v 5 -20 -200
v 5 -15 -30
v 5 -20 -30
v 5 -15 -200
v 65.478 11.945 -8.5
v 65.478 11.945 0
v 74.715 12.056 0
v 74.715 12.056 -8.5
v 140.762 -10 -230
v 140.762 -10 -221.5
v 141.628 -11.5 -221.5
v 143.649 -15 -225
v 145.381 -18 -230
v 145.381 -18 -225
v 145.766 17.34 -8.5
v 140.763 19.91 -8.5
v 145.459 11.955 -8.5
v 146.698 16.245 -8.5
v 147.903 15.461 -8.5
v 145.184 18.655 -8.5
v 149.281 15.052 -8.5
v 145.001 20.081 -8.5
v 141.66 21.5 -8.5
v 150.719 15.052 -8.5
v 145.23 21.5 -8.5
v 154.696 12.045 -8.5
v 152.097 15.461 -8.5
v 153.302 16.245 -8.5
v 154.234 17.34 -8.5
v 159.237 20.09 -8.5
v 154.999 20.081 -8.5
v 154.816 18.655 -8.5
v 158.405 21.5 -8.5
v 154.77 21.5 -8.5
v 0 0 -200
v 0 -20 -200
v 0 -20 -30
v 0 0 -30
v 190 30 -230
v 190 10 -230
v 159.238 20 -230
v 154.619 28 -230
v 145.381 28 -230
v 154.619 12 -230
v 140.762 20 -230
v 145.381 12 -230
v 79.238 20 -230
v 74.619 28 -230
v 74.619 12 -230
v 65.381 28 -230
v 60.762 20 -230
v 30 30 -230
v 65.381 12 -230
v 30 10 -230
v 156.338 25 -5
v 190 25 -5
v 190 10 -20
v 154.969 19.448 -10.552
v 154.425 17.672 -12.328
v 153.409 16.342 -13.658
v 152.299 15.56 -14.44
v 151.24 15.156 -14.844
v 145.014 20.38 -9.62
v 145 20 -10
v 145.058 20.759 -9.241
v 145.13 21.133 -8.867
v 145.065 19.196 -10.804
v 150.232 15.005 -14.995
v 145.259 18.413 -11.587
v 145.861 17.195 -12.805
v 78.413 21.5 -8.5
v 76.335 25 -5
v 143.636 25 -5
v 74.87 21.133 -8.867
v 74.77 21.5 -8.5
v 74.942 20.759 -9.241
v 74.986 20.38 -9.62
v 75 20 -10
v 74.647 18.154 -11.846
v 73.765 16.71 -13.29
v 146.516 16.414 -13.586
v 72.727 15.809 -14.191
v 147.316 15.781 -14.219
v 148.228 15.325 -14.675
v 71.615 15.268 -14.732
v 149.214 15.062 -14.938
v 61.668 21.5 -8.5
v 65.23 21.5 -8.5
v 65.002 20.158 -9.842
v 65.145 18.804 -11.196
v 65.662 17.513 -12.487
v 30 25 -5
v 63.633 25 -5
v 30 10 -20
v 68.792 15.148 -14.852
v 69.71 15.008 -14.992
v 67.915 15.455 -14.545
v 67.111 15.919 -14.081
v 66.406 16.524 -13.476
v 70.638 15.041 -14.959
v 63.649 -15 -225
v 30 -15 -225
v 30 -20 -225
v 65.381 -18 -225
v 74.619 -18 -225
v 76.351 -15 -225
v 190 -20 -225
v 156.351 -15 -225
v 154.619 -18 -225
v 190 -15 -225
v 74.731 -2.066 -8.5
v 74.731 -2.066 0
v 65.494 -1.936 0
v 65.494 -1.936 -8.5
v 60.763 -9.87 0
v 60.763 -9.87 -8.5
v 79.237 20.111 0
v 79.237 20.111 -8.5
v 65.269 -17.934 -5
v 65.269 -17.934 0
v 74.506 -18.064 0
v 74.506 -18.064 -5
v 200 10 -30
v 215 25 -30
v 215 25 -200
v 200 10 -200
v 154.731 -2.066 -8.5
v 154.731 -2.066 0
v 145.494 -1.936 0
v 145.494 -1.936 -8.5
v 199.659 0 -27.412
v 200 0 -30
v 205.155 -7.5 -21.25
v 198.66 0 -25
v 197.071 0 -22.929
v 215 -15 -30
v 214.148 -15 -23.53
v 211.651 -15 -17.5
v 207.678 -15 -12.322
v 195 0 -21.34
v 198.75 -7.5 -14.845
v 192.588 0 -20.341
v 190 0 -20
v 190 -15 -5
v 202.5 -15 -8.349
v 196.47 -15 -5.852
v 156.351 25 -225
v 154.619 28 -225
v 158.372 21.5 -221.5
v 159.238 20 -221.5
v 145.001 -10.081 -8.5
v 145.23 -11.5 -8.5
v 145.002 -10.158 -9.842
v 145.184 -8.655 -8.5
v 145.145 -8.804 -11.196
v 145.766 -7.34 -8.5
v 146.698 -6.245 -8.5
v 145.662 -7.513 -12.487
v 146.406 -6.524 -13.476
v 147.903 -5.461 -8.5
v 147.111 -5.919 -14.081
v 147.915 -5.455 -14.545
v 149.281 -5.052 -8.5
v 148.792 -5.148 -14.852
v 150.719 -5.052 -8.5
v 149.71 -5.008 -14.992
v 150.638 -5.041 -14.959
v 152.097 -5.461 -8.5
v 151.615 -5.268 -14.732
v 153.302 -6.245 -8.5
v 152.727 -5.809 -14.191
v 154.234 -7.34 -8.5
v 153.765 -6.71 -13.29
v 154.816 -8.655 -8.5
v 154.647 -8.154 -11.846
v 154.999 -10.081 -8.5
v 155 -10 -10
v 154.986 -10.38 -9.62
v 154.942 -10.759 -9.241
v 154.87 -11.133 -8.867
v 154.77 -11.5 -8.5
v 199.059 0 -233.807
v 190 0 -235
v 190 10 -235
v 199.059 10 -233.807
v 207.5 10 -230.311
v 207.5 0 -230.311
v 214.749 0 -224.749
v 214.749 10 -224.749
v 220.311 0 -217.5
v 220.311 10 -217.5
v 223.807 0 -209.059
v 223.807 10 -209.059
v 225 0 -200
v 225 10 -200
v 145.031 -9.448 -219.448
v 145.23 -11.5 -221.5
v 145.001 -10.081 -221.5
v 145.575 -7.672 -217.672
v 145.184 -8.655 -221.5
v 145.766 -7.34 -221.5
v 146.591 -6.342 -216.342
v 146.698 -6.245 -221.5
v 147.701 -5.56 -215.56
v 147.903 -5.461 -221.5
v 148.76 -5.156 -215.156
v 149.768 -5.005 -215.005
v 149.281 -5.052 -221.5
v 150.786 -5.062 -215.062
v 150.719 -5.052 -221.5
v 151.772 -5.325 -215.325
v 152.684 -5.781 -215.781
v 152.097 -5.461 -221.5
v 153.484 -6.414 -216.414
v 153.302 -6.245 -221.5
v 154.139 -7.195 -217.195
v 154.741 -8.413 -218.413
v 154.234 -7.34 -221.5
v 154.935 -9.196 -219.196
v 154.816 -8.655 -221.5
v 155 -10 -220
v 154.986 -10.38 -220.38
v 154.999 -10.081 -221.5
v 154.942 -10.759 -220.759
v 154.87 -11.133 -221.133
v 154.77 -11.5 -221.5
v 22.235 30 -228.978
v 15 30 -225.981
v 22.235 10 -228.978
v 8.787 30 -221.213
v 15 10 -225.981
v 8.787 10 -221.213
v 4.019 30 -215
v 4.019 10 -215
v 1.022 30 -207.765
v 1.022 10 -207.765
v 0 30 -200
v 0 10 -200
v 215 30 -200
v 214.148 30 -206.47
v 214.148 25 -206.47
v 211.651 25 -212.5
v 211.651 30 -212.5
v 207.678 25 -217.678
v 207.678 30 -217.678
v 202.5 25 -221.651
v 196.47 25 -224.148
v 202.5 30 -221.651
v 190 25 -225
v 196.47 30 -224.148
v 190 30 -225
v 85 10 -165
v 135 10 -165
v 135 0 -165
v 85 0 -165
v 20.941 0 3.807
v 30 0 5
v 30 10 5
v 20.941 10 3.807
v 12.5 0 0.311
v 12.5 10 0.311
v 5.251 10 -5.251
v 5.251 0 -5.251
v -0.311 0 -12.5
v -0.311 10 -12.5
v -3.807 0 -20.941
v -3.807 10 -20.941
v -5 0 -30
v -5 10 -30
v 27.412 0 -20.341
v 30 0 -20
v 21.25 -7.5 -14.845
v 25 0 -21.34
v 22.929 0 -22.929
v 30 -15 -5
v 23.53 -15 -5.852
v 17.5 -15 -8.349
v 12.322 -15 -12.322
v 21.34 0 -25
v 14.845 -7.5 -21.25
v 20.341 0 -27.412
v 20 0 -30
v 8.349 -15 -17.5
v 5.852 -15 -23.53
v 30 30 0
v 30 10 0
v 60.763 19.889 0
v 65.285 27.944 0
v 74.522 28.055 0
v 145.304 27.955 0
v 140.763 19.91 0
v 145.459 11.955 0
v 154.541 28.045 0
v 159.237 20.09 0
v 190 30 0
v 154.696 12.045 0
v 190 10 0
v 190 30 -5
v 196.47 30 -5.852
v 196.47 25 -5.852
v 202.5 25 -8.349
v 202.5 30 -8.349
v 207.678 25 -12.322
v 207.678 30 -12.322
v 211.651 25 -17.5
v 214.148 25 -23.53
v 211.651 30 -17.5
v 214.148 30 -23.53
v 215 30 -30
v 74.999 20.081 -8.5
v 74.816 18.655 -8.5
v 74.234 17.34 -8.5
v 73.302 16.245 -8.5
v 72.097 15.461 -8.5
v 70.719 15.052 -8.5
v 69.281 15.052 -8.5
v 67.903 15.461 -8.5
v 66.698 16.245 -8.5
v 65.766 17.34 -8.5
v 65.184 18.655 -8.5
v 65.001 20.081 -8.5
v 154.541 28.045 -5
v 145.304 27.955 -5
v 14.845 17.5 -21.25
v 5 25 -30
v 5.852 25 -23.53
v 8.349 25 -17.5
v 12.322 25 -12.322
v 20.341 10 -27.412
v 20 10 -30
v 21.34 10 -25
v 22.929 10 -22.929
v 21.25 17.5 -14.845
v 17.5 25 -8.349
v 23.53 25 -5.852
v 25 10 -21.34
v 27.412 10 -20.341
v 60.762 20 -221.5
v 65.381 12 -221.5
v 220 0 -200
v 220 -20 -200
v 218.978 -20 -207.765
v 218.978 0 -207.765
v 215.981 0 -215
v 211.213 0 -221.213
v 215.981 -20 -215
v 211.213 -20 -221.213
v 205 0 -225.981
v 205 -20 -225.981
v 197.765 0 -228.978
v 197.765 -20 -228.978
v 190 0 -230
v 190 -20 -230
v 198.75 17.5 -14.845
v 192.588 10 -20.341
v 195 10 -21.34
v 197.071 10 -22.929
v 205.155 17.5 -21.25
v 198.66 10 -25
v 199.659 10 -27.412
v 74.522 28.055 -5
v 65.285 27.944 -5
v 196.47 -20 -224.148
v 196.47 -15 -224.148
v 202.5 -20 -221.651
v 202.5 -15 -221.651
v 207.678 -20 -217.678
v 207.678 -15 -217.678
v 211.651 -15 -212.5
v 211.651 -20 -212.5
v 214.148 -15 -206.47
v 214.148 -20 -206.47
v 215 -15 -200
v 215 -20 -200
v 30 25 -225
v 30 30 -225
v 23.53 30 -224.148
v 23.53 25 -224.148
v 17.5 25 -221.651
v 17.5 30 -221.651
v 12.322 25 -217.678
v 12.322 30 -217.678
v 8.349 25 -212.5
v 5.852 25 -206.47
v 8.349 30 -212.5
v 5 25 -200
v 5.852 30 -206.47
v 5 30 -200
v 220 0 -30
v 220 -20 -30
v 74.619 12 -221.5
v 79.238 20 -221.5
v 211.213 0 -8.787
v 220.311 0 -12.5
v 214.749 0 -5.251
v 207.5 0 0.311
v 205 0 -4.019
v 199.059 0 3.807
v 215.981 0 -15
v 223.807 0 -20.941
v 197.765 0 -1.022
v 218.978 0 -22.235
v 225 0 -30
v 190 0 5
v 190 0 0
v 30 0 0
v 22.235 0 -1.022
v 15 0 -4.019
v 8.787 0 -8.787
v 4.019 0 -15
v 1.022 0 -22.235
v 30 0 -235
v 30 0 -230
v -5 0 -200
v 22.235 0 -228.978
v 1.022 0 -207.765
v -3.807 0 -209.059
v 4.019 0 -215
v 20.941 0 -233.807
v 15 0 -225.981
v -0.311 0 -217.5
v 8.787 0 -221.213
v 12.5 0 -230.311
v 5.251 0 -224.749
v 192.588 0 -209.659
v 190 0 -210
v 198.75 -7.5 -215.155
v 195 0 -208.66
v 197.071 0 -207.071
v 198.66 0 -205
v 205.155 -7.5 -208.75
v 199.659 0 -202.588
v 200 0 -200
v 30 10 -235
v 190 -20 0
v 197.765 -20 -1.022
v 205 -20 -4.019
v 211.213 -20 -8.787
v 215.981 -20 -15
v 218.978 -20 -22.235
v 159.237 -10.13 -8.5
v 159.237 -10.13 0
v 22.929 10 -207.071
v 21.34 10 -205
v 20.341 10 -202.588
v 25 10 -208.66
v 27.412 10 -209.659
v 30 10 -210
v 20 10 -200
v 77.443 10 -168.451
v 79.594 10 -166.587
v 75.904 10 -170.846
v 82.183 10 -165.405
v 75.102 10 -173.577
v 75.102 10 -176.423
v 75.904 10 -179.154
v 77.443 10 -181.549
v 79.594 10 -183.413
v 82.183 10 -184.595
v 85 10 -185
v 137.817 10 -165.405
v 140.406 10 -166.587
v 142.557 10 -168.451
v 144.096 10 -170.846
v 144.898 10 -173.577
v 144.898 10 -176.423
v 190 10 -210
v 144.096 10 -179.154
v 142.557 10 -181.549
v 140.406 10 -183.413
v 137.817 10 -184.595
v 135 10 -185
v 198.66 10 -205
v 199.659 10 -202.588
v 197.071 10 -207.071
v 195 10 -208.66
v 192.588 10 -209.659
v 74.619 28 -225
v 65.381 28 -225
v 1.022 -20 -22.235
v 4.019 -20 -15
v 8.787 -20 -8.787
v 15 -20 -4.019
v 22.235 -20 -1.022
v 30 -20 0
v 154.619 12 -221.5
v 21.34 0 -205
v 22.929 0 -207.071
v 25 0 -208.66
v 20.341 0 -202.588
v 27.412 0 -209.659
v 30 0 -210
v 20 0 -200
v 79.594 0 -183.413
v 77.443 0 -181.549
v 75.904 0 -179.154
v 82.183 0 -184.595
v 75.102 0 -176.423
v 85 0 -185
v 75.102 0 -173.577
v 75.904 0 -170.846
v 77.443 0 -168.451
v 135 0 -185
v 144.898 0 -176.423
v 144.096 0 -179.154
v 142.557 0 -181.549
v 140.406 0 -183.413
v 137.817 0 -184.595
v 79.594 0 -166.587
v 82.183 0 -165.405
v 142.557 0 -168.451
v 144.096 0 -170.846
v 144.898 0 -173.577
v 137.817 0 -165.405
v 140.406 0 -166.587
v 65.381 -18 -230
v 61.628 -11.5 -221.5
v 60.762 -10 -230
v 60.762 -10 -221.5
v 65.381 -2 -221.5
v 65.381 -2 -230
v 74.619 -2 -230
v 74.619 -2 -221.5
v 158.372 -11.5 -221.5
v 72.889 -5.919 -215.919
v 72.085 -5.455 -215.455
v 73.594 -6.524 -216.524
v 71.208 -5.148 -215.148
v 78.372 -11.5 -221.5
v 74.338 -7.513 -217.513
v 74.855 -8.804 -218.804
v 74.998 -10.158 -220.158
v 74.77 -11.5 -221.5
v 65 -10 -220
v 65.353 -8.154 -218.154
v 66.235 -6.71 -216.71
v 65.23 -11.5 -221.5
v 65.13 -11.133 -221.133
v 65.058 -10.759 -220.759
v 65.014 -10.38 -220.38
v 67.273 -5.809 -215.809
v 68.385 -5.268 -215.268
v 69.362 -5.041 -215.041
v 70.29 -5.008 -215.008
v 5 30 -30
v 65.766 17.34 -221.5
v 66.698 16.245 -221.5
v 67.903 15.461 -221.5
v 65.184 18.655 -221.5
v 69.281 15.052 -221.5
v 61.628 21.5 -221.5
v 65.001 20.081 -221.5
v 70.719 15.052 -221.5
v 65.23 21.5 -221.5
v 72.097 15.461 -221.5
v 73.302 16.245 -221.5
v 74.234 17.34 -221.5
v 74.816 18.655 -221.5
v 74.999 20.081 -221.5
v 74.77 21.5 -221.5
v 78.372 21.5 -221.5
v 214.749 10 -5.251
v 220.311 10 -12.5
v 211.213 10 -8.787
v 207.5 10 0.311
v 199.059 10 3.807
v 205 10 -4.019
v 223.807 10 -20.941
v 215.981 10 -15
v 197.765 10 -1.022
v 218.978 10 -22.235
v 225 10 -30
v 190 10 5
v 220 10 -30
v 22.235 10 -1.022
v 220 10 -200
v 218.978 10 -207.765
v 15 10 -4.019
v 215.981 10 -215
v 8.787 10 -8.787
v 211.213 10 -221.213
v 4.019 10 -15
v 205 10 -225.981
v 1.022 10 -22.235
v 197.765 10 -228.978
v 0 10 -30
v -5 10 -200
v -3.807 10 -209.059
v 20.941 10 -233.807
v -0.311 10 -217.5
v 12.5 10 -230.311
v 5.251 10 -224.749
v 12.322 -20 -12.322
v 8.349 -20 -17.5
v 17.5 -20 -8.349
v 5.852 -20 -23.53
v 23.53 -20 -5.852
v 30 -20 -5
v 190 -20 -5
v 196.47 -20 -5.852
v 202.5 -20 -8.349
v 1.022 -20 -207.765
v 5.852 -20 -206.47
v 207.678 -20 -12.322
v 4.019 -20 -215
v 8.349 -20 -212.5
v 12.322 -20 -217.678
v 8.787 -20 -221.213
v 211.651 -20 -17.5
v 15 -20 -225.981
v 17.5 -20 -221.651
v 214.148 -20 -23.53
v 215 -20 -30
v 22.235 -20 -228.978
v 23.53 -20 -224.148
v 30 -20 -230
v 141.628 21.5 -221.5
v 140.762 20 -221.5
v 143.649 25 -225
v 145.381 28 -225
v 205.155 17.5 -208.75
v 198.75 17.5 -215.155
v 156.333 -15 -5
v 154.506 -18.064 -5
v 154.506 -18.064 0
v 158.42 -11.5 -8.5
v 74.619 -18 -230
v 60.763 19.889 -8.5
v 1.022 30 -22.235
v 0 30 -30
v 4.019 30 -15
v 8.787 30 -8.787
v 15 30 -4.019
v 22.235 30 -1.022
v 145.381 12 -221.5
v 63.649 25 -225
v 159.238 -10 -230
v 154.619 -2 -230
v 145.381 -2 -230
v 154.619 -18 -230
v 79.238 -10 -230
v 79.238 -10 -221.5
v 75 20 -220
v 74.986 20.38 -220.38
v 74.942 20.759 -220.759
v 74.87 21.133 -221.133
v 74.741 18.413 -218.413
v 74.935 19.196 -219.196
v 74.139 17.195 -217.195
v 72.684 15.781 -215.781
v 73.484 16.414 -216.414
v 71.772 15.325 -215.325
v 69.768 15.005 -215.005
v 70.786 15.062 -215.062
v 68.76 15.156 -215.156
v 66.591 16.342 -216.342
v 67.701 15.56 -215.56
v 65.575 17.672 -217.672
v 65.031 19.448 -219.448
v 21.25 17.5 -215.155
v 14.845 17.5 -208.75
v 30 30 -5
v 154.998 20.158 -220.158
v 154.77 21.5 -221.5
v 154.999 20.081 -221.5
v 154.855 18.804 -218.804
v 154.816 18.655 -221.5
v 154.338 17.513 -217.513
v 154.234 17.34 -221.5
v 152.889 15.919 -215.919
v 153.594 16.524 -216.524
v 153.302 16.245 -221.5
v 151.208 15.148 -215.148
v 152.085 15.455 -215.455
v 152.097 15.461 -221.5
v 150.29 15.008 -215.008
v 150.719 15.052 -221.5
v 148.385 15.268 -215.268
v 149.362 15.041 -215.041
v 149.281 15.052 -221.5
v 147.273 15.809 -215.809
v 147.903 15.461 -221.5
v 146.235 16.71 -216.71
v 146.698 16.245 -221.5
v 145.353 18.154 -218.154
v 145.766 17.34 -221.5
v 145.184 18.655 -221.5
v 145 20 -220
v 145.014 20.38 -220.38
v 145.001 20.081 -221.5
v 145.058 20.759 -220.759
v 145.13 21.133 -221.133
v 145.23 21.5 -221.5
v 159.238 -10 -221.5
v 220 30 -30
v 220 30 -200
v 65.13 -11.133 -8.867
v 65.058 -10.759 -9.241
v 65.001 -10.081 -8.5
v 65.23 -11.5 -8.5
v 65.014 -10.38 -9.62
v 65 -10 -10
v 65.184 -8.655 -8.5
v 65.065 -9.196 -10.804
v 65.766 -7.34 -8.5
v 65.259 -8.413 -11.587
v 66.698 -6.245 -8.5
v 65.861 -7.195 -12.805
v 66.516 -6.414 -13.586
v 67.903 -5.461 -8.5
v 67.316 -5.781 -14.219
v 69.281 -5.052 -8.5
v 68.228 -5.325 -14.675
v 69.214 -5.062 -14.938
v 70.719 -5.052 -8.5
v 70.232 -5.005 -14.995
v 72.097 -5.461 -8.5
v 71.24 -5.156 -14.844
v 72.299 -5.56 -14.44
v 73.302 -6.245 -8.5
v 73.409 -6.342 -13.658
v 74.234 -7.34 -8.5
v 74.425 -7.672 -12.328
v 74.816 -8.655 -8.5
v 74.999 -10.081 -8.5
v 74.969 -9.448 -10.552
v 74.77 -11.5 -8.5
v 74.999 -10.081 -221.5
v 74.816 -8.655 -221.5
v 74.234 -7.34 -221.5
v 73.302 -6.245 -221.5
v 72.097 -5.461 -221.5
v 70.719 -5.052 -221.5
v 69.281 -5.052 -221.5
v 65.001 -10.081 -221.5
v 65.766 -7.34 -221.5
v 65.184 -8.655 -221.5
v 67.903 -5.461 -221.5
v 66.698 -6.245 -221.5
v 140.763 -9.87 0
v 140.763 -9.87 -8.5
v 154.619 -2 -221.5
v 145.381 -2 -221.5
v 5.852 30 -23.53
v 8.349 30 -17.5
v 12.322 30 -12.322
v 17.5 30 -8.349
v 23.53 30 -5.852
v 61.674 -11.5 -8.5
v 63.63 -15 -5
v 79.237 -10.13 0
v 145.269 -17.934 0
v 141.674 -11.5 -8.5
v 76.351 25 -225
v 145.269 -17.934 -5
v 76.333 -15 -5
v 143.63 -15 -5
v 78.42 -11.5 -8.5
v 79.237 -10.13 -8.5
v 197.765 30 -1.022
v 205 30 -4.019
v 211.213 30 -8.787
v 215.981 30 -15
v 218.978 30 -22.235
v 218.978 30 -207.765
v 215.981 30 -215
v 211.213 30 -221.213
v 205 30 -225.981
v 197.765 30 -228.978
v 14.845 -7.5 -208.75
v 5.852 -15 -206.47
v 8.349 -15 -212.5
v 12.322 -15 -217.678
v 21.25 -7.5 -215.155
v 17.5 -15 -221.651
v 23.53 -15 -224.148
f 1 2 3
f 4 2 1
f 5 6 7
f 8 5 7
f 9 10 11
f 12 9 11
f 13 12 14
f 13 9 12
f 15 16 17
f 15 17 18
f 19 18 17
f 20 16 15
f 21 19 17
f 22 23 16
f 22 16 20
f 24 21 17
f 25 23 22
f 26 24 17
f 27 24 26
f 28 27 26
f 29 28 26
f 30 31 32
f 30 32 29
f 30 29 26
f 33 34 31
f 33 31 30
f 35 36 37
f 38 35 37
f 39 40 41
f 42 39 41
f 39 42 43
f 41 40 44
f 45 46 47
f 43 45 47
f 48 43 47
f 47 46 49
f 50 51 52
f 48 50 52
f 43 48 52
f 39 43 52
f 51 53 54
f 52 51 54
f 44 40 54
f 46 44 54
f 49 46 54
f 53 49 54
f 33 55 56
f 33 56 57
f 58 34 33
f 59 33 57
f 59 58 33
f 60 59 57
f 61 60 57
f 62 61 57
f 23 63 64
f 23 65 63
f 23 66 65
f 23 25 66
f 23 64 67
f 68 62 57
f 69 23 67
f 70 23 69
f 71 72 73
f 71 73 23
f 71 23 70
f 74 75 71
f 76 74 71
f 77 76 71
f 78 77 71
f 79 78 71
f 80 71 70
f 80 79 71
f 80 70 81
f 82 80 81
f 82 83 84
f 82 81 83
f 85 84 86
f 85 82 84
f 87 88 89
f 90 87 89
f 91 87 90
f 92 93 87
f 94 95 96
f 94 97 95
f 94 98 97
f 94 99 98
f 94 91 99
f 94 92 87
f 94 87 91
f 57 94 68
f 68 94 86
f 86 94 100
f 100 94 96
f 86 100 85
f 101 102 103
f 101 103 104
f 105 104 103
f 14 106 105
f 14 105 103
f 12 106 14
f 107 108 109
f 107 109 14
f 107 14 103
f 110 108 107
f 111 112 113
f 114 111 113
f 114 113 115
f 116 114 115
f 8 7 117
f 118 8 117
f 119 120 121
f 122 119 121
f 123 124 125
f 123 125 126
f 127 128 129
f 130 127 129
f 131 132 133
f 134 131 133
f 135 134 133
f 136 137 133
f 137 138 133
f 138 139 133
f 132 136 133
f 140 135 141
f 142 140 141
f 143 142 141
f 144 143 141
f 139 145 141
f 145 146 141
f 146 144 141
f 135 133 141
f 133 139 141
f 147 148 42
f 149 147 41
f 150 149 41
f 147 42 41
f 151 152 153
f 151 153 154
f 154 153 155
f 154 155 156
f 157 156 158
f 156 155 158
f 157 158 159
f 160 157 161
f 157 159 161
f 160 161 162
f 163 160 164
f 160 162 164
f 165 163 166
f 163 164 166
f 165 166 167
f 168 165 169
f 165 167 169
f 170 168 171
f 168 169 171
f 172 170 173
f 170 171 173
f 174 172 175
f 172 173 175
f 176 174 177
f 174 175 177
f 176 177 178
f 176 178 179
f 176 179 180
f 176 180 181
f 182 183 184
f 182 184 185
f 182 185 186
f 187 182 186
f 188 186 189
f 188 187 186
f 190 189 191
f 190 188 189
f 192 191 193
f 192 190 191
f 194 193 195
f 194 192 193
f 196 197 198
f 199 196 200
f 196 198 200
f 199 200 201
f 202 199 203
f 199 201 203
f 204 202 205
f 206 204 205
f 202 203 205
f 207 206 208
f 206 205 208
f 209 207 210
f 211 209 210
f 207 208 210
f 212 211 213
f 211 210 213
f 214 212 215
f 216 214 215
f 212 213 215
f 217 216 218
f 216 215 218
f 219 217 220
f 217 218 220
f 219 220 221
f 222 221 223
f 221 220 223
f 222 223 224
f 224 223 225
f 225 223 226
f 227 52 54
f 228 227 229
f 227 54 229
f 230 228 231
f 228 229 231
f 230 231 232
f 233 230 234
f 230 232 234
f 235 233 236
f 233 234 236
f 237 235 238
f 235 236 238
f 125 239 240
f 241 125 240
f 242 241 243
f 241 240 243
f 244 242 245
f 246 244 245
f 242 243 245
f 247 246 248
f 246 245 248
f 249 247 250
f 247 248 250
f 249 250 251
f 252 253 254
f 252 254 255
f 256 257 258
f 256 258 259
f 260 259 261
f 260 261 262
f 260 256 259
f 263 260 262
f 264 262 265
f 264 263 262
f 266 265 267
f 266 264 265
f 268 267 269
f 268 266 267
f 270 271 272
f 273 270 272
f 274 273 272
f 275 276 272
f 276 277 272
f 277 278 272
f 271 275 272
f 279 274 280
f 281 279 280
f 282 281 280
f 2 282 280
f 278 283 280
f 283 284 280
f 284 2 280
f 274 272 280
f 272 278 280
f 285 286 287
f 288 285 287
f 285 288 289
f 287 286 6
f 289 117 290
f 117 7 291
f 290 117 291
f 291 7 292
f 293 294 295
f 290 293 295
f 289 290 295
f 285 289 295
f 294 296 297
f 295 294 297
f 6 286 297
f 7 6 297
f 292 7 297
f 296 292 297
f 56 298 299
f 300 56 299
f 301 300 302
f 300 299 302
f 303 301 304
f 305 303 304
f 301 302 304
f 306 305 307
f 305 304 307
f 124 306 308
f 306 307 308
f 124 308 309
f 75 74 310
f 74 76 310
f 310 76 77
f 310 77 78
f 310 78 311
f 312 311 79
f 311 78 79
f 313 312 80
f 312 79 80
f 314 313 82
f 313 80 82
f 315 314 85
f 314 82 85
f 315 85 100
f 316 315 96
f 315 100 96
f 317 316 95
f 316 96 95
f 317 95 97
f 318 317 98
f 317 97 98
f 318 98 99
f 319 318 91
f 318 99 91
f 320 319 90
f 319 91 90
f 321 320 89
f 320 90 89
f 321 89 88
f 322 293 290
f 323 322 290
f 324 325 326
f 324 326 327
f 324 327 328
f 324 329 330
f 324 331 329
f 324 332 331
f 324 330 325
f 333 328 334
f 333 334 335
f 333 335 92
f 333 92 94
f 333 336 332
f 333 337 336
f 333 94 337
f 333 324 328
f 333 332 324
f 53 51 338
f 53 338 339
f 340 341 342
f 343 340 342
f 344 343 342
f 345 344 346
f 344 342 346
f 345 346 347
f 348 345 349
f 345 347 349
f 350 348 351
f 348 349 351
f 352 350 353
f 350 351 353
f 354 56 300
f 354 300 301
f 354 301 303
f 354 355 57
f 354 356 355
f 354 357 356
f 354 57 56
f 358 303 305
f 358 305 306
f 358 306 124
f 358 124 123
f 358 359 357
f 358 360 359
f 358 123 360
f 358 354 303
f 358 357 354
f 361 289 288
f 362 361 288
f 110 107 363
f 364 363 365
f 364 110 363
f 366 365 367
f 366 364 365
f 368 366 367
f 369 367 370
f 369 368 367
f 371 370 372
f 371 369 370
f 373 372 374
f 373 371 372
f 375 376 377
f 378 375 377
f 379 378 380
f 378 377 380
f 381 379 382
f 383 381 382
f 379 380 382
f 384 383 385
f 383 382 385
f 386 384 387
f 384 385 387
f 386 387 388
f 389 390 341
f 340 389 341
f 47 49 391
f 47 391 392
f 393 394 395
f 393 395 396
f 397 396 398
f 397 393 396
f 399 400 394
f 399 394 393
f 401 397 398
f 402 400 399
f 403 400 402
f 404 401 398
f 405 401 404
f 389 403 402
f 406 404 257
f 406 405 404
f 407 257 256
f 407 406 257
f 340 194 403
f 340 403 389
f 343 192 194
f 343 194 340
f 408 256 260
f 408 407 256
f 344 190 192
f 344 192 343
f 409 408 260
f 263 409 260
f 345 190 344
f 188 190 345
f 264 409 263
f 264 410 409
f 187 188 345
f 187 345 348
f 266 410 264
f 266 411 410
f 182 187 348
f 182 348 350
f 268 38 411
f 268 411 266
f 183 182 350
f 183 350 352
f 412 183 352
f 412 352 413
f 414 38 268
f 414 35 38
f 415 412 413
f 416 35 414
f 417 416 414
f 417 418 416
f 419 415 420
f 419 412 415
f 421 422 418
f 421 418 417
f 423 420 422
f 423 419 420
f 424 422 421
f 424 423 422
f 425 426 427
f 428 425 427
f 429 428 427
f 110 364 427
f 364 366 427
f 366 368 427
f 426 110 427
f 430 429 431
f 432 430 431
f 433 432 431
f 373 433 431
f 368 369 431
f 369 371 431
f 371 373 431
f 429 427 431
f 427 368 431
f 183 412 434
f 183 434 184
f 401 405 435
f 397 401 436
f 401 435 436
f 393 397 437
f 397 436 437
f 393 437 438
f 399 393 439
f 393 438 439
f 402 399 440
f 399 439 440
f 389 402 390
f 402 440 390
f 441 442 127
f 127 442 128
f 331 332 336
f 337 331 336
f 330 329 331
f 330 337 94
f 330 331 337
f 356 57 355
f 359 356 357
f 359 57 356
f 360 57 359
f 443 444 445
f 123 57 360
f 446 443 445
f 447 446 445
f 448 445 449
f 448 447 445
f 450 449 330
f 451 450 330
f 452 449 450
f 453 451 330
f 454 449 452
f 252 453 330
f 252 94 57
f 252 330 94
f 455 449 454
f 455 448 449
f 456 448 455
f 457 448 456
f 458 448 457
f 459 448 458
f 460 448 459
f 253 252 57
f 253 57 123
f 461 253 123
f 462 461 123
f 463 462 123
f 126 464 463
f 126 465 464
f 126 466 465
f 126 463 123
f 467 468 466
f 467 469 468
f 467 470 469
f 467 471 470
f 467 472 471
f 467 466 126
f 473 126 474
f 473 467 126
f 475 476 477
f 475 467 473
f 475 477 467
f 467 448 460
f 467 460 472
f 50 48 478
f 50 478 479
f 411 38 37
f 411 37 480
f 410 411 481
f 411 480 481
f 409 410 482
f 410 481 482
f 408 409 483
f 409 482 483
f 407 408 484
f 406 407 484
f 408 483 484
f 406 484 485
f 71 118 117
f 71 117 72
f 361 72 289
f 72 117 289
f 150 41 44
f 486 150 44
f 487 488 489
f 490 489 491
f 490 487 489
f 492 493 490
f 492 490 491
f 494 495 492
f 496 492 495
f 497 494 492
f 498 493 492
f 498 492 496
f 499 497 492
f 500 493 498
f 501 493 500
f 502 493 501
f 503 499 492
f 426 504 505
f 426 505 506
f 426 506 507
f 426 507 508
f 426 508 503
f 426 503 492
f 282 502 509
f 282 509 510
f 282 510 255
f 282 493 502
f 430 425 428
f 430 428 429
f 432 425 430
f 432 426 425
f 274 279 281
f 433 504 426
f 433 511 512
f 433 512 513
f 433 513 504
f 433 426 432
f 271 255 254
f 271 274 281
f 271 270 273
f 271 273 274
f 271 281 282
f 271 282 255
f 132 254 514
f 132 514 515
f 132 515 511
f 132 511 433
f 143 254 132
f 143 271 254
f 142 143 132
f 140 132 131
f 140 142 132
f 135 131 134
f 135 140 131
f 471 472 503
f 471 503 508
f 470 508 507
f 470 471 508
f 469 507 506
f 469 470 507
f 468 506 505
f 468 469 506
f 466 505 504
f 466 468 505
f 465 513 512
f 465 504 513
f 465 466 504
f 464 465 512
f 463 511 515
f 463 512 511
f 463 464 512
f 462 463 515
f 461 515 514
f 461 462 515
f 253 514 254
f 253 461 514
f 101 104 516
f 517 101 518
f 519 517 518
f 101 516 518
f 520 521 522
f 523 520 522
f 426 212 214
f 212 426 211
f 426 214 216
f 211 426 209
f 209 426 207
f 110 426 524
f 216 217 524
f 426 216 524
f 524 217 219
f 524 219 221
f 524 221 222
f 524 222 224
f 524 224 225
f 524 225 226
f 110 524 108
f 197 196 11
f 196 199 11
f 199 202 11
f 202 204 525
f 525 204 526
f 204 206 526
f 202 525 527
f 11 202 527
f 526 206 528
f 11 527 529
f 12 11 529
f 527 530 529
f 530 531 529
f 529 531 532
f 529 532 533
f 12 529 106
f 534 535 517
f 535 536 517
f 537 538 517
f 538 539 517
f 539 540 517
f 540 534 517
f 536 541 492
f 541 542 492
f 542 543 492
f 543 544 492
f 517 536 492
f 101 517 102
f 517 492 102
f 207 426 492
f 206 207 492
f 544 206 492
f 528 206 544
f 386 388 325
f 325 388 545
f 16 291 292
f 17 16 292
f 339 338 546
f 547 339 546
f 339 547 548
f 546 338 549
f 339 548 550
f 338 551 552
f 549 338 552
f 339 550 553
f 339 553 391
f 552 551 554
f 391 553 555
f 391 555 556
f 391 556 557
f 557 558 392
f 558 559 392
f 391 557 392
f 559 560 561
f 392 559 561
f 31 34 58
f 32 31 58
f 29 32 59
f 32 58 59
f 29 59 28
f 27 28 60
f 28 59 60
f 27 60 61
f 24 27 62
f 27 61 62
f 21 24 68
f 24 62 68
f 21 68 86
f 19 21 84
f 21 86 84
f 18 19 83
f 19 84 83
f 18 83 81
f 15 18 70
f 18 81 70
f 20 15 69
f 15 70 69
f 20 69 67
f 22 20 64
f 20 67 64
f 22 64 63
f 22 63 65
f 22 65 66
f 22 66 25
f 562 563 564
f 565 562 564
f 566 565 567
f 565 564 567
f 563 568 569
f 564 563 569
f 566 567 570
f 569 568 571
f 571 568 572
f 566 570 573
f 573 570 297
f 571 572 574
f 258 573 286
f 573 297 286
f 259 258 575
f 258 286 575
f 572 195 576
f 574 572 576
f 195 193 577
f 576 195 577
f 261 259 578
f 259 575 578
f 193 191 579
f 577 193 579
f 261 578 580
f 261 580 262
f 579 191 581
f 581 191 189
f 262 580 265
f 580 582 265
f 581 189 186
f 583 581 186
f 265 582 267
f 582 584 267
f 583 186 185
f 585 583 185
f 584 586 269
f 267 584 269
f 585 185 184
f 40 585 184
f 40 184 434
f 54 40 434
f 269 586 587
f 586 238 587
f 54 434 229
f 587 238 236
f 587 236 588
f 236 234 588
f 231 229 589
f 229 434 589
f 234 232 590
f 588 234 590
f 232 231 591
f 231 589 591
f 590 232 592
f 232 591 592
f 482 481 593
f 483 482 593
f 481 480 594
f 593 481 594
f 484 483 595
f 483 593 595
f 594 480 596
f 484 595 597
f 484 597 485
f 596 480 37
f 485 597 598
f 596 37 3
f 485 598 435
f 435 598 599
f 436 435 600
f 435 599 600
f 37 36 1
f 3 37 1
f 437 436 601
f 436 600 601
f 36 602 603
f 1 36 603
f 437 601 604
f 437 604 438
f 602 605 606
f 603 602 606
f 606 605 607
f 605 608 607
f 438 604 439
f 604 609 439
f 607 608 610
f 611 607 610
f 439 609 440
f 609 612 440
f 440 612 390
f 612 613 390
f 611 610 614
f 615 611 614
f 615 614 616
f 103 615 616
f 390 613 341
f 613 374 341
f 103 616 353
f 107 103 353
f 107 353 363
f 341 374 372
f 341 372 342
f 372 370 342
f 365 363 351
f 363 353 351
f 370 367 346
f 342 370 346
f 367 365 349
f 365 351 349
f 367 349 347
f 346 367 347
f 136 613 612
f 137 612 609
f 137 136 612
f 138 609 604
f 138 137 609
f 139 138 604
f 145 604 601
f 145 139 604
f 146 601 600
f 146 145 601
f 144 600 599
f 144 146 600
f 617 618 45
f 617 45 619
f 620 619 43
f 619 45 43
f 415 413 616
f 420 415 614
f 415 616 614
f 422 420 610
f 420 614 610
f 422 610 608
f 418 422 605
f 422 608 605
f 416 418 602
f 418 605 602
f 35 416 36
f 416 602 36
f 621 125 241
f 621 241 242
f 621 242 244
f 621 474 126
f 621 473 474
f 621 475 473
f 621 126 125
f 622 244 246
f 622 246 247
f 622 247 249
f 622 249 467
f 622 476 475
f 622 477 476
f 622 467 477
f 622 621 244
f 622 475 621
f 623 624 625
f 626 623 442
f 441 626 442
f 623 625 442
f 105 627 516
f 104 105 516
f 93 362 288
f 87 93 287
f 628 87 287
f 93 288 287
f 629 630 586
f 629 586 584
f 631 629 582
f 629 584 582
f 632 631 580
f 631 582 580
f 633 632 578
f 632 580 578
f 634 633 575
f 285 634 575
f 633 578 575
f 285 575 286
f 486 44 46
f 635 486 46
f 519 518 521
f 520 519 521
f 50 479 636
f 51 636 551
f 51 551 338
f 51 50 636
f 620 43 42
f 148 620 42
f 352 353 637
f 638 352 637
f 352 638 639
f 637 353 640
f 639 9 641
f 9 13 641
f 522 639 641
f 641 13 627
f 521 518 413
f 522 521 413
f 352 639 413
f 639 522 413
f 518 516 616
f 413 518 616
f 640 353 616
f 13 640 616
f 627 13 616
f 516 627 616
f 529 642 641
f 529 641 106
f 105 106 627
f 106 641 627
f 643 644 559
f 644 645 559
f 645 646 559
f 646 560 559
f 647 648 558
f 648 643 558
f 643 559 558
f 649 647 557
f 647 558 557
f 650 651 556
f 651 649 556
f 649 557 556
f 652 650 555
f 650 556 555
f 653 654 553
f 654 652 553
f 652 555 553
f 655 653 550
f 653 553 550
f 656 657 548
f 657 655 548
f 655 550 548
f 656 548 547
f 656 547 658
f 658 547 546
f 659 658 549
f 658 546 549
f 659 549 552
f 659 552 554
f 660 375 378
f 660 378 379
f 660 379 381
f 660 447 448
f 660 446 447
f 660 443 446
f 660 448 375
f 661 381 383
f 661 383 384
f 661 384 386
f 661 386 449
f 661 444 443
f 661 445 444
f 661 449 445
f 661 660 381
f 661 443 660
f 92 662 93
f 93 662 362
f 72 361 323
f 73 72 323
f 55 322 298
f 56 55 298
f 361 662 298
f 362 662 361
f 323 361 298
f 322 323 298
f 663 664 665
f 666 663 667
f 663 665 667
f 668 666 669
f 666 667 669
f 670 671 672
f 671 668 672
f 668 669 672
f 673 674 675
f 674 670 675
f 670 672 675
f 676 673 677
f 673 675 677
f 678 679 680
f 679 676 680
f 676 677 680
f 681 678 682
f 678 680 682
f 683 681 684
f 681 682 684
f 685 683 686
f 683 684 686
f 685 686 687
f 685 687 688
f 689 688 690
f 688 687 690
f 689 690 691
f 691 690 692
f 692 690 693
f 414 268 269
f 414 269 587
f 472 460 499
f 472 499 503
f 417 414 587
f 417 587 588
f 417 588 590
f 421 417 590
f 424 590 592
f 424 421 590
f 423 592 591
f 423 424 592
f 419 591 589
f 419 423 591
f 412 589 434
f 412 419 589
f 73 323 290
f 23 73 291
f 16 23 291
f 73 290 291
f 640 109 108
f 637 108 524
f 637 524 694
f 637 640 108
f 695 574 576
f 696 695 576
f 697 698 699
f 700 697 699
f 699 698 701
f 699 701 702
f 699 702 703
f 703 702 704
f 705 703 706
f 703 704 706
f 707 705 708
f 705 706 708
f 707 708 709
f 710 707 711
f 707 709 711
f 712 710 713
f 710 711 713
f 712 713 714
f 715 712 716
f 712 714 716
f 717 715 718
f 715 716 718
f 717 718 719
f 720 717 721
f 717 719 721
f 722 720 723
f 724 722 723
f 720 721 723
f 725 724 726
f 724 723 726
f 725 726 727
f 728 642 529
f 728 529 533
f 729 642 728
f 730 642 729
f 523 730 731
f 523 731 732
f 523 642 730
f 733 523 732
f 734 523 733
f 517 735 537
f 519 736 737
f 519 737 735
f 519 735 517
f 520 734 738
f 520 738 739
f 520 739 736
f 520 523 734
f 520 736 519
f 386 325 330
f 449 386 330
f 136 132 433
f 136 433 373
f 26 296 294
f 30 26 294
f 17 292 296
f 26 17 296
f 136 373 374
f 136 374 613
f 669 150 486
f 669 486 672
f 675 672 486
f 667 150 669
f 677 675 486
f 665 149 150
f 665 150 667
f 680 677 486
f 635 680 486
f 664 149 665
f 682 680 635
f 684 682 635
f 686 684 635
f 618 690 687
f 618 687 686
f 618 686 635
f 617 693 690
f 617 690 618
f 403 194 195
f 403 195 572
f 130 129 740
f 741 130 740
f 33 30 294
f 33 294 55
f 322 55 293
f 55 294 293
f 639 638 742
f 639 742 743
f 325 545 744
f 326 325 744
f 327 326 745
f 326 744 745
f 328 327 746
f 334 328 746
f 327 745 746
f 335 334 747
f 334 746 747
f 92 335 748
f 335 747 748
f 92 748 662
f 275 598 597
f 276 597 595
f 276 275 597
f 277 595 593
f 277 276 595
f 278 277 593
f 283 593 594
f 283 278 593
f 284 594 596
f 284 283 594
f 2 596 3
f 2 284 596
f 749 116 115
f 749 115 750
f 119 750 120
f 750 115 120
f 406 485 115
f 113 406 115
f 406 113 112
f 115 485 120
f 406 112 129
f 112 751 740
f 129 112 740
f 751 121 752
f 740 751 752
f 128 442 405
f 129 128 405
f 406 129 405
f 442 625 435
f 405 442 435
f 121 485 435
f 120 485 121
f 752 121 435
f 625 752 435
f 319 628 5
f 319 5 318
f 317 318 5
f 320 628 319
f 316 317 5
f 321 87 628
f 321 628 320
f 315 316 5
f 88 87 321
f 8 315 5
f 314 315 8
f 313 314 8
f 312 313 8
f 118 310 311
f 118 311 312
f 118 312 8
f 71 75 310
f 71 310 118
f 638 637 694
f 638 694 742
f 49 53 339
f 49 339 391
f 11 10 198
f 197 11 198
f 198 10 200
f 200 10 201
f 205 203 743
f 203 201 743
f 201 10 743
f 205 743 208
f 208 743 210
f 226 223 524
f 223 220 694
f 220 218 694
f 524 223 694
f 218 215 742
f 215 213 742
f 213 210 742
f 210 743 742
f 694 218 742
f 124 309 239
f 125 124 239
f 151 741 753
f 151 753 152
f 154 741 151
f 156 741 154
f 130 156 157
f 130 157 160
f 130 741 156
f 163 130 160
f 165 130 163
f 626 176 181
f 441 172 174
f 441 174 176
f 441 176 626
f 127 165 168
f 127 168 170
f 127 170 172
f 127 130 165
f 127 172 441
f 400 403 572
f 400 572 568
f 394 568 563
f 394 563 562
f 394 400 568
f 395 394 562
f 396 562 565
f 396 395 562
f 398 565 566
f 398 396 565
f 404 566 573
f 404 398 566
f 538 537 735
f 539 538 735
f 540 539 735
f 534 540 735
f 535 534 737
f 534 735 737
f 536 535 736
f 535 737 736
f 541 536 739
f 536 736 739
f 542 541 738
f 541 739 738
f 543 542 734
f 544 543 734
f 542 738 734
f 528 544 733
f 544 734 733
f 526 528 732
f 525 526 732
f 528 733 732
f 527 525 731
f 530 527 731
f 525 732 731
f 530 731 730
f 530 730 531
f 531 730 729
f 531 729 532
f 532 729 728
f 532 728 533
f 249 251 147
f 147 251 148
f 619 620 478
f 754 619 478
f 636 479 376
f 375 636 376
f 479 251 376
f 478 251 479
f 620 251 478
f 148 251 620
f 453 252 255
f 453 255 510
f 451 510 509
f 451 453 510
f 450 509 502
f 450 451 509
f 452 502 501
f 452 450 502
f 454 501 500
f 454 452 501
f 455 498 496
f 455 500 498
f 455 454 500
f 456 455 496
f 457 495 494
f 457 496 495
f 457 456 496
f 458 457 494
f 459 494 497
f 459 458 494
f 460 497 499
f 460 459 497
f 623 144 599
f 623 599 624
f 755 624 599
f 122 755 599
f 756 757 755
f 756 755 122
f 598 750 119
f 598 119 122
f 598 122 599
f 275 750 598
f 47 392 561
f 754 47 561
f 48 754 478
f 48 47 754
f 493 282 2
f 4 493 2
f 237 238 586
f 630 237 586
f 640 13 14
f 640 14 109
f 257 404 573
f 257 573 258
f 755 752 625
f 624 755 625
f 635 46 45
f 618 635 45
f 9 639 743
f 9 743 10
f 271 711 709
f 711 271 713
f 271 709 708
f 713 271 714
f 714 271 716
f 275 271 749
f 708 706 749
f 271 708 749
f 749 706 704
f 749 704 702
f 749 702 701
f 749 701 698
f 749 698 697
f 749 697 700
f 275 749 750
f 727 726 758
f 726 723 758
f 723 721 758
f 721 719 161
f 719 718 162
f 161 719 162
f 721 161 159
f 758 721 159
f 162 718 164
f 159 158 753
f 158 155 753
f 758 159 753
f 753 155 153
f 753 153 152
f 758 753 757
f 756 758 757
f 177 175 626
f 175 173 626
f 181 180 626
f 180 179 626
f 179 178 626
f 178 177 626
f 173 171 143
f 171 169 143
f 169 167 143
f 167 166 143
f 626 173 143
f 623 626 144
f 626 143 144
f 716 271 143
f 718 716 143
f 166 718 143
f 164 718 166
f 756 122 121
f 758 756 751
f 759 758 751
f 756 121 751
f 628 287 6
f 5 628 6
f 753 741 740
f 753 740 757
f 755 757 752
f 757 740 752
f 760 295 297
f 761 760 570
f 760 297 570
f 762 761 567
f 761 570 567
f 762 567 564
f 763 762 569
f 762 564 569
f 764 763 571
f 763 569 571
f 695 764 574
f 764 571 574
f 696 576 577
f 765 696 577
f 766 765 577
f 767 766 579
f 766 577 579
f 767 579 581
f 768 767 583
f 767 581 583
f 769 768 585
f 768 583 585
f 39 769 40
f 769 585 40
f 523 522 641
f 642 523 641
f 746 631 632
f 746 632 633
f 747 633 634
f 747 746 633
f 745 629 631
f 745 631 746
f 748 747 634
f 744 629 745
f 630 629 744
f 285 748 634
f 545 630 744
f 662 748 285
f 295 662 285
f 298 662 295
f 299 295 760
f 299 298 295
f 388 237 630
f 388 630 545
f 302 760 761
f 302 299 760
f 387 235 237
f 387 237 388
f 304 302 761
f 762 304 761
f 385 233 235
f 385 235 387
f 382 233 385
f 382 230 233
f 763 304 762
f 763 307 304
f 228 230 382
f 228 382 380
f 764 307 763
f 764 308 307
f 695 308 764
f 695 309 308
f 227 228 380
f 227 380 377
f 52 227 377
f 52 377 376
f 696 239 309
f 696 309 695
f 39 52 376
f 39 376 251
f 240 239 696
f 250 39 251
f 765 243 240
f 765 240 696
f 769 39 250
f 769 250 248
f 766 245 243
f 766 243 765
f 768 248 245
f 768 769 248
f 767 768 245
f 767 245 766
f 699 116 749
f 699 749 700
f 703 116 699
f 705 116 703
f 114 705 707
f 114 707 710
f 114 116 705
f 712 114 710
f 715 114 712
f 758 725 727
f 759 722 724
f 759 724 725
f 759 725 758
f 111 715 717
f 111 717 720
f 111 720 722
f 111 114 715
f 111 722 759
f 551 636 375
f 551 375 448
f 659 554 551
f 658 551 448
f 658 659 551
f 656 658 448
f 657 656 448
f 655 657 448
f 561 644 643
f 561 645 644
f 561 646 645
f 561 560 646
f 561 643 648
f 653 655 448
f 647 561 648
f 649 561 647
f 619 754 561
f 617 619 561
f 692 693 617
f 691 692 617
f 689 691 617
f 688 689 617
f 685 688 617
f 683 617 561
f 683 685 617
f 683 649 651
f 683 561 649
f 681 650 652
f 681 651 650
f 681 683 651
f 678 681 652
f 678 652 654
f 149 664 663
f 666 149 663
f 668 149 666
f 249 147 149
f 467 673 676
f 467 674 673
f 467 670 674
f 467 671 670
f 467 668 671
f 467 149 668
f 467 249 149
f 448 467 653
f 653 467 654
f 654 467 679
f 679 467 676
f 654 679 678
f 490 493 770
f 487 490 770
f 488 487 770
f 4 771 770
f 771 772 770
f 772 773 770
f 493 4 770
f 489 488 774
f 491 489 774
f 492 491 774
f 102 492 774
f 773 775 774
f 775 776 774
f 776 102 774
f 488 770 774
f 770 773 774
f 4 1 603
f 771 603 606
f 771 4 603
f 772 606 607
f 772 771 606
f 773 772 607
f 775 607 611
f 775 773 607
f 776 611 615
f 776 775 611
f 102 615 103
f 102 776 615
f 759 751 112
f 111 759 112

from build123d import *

# Parameters (mm, degrees)
BOSS_EXTRUDE1_DEPTH      = 30
BOSS_EXTRUDE1_DEPTH_BACK = 20
BOSS_EXTRUDE2_DEPTH      = 10
SKETCH2_R                = 5
CUT_EXTRUDE1_DEPTH       = 30
CUT_EXTRUDE3_START       = -30
SKETCH3_R                = 5
CUT_EXTRUDE3_DEPTH       = 30
CUT_EXTRUDE5_DEPTH       = 330.165611813
CUT_EXTRUDE7_DEPTH       = 20
CUT_EXTRUDE8_START       = -20
CUT_EXTRUDE8_DEPTH       = 20
CHAMFER7_SIZE            = 15
CUT_EXTRUDE6_DEPTH       = 8.5
SKETCH2_4_R              = 5
CUT_EXTRUDE2_DEPTH       = 8.5


with BuildPart() as part:
    # Sketch1 → Boss-Extrude1 (new, two sides: drawn at the far end of the back side and taken through both)
    with BuildSketch(Plane(origin=(0, 0, 0), x_dir=(1, 0, 0), z_dir=(0, 1, 0)).offset(-BOSS_EXTRUDE1_DEPTH_BACK)):
        with BuildLine():
            Line((30, 0), (190, 0))
            ThreePointArc((190, 0), (211.213203436, 8.786796564), (220, 30))
            Line((220, 30), (220, 200))
            ThreePointArc((220, 200), (211.213203436, 221.213203436), (190, 230))
            Line((190, 230), (30, 230))
            ThreePointArc((30, 230), (8.786796564, 221.213203436), (0, 200))
            Line((0, 200), (0, 30))
            ThreePointArc((0, 30), (8.786796564, 8.786796564), (30, 0))
        make_face()
    extrude(amount=BOSS_EXTRUDE1_DEPTH + BOSS_EXTRUDE1_DEPTH_BACK)

    # Sketch1<3> → Boss-Extrude2 (add)
    with BuildSketch(Plane(origin=(0, 0, 0), x_dir=(1, 0, 0), z_dir=(0, 1, 0))):
        with BuildLine():
            Line((-5, 30), (-5, 200))
            ThreePointArc((-5, 200), (5.251262658, 224.748737342), (30, 235))
            Line((30, 235), (190, 235))
            ThreePointArc((190, 235), (214.748737342, 224.748737342), (225, 200))
            Line((225, 200), (225, 30))
            ThreePointArc((225, 30), (214.748737342, 5.251262658), (190, -5))
            Line((190, -5), (30, -5))
            ThreePointArc((30, -5), (5.251262658, 5.251262658), (-5, 30))
        make_face()
        with BuildLine():
            Line((30, 0), (190, 0))
            ThreePointArc((190, 0), (211.213203436, 8.786796564), (220, 30))
            Line((220, 30), (220, 200))
            ThreePointArc((220, 200), (211.213203436, 221.213203436), (190, 230))
            Line((190, 230), (30, 230))
            ThreePointArc((30, 230), (8.786796564, 221.213203436), (0, 200))
            Line((0, 200), (0, 30))
            ThreePointArc((0, 30), (8.786796564, 8.786796564), (30, 0))
        make_face(mode=Mode.SUBTRACT)
    extrude(amount=BOSS_EXTRUDE2_DEPTH)

    # Sketch2 → Cut-Extrude1 (cut)
    with BuildSketch(Plane(origin=(0, 0, -230), x_dir=(-1, 0, 0), z_dir=(0, 0, -1))):
        with Locations((-150, 20)):
            Circle(SKETCH2_R)
        with Locations(Location((-70, 20, 0), (0, 0, 180))):
            Circle(SKETCH2_R)
        with Locations((-70, -10)):
            Circle(SKETCH2_R)
        with Locations(Location((-150, -10, 0), (0, 0, 180))):
            Circle(SKETCH2_R)
    extrude(amount=-CUT_EXTRUDE1_DEPTH, mode=Mode.SUBTRACT)

    # Sketch3 → Cut-Extrude3 (cut)
    with BuildSketch(Plane.XY.offset(CUT_EXTRUDE3_START)):
        with Locations((70, 20)):
            Circle(SKETCH3_R)
        with Locations(Location((150, 20, 0), (0, 0, 180))):
            Circle(SKETCH3_R)
        with Locations((150, -10)):
            Circle(SKETCH3_R)
        with Locations(Location((70, -10, 0), (0, 0, 180))):
            Circle(SKETCH3_R)
    extrude(amount=CUT_EXTRUDE3_DEPTH, mode=Mode.SUBTRACT)

    # Sketch4 → Cut-Extrude5 (cut, through all)
    with BuildSketch(Plane(origin=(0, 30, 0), x_dir=(1, 0, 0), z_dir=(0, 1, 0))):
        with BuildLine():
            Line((135, 165), (85, 165))
            ThreePointArc((85, 165), (75, 175), (85, 185))
            Line((85, 185), (135, 185))
            ThreePointArc((135, 185), (145, 175), (135, 165))
        make_face()
    extrude(amount=-CUT_EXTRUDE5_DEPTH, mode=Mode.SUBTRACT)

    # Sketch7 → Cut-Extrude7 (cut)
    with BuildSketch(Plane(origin=(0, 30, 0), x_dir=(1, 0, 0), z_dir=(0, 1, 0))):
        with BuildLine():
            Line((215, 30), (215, 200))
            ThreePointArc((215, 200), (207.67766953, 217.67766953), (190, 225))
            Line((190, 225), (30, 225))
            ThreePointArc((30, 225), (12.32233047, 217.67766953), (5, 200))
            Line((5, 200), (5, 30))
            ThreePointArc((5, 30), (12.32233047, 12.32233047), (30, 5))
            Line((30, 5), (190, 5))
            ThreePointArc((190, 5), (207.67766953, 12.32233047), (215, 30))
        make_face()
    extrude(amount=-CUT_EXTRUDE7_DEPTH, mode=Mode.SUBTRACT)

    # Sketch9 → Cut-Extrude8 (cut)
    with BuildSketch(Plane.XZ.offset(20).offset(CUT_EXTRUDE8_START)):
        with BuildLine():
            Line((190, -5), (30, -5))
            ThreePointArc((30, -5), (12.32233047, -12.32233047), (5, -30))
            Line((5, -30), (5, -200))
            ThreePointArc((5, -200), (12.32233047, -217.67766953), (30, -225))
            Line((30, -225), (190, -225))
            ThreePointArc((190, -225), (207.67766953, -217.67766953), (215, -200))
            Line((215, -200), (215, -30))
            ThreePointArc((215, -30), (207.67766953, -12.32233047), (190, -5))
        make_face()
    extrude(amount=CUT_EXTRUDE8_DEPTH, mode=Mode.SUBTRACT)

    # Chamfer7
    # the kernel refuses this chamfer: 15 mm, written as the material it adds along each edge
    with BuildSketch(Plane(origin=(190, 10, -225), x_dir=(0, 0.9996219169112968, -0.02749587661058586), z_dir=(-1, 0, 0))) as chamfer7_piece_1_section:
        Polygon((CHAMFER7_SIZE * 0.999621916911, -CHAMFER7_SIZE * 0.0274958766106), (-CHAMFER7_SIZE * 0.0274958766106, -CHAMFER7_SIZE * 0.999621916911), (0, 0), align=None)
    chamfer7_piece_1 = extrude(amount=160, mode=Mode.PRIVATE)
    chamfer7_piece_1 = chamfer7_piece_1 - Plane(origin=(150, 20, -219.960339284), x_dir=(-1, 0, 0), z_dir=(0, 0, -1)) * Cylinder(5, 380, mode=Mode.PRIVATE)
    chamfer7_piece_1 = chamfer7_piece_1 - Plane(origin=(70, 20, -219.960339284), x_dir=(1, 0, 0), z_dir=(0, 0, -1)) * Cylinder(5, 380, mode=Mode.PRIVATE)
    add(chamfer7_piece_1)
    with BuildSketch(Plane(origin=(30, 10, -5), x_dir=(0, 0.9996219169112968, 0.02749587661058638), z_dir=(1, 0, 0))) as chamfer7_piece_2_section:
        Polygon((CHAMFER7_SIZE * 0.999621916911, -CHAMFER7_SIZE * 0.0274958766106), (-CHAMFER7_SIZE * 0.0274958766106, -CHAMFER7_SIZE * 0.999621916911), (0, 0), align=None)
    chamfer7_piece_2 = extrude(amount=160, mode=Mode.PRIVATE)
    chamfer7_piece_2 = chamfer7_piece_2 - Plane(origin=(70, 20, -10.039660716), x_dir=(1, 0, 0), z_dir=(0, 0, -1)) * Cylinder(5, 380, mode=Mode.PRIVATE)
    chamfer7_piece_2 = chamfer7_piece_2 - Plane(origin=(150, 20, -10.039660716), x_dir=(-1, 0, 0), z_dir=(0, 0, -1)) * Cylinder(5, 380, mode=Mode.PRIVATE)
    add(chamfer7_piece_2)
    with BuildSketch(Plane(origin=(190, 10, -30), x_dir=(0, 0, 1), z_dir=(-1, 0, 0))) as chamfer7_piece_3:
        Polygon((25, CHAMFER7_SIZE), (25 - CHAMFER7_SIZE, 0), (25, 0), align=None)
    revolve(axis=Axis((190, 10, -30), (0, 1, 0)), revolution_arc=90)
    with BuildSketch(Plane(origin=(30, 10, -30), x_dir=(-1, 0, 0), z_dir=(0, 0, -1))) as chamfer7_piece_4:
        Polygon((25, CHAMFER7_SIZE), (25 - CHAMFER7_SIZE, 0), (25, 0), align=None)
    revolve(axis=Axis((30, 10, -30), (0, 1, 0)), revolution_arc=90)
    with BuildSketch(Plane(origin=(5, 10, -200), x_dir=(-0.02749587661058638, 0.9996219169112968, 0), z_dir=(0, 0, 1)), Plane(origin=(215, 10, -30), x_dir=(0.02749587661058586, 0.9996219169112968, 0), z_dir=(0, 0, -1))) as chamfer7_piece_5:
        Polygon((CHAMFER7_SIZE * 0.999621916911, -CHAMFER7_SIZE * 0.0274958766106), (-CHAMFER7_SIZE * 0.0274958766106, -CHAMFER7_SIZE * 0.999621916911), (0, 0), align=None)
    extrude(amount=170)
    with BuildSketch(Plane(origin=(30, 10, -200), x_dir=(0, 0, -1), z_dir=(1, 0, 0))) as chamfer7_piece_6:
        Polygon((25, CHAMFER7_SIZE), (25 - CHAMFER7_SIZE, 0), (25, 0), align=None)
    revolve(axis=Axis((30, 10, -200), (0, 1, 0)), revolution_arc=90)
    with BuildSketch(Plane(origin=(190, 10, -200), x_dir=(1, 0, 0), z_dir=(0, 0, 1))) as chamfer7_piece_7:
        Polygon((25, CHAMFER7_SIZE), (25 - CHAMFER7_SIZE, 0), (25, 0), align=None)
    revolve(axis=Axis((190, 10, -200), (0, 1, 0)), revolution_arc=90)
    with BuildSketch(Plane(origin=(30, 0, -225), x_dir=(0, 0.027495876610586382, 0.9996219169112968), z_dir=(1, 0, 0))) as chamfer7_piece_8_section:
        Polygon((CHAMFER7_SIZE * 0.999621916911, CHAMFER7_SIZE * 0.0274958766106), (-CHAMFER7_SIZE * 0.0274958766106, CHAMFER7_SIZE * 0.999621916911), (0, 0), align=None)
    chamfer7_piece_8 = extrude(amount=160, mode=Mode.PRIVATE)
    chamfer7_piece_8 = chamfer7_piece_8 - Plane(origin=(150, -10, -219.960344511), x_dir=(1, 0, 0), z_dir=(0, 0, -1)) * Cylinder(5, 380, mode=Mode.PRIVATE)
    chamfer7_piece_8 = chamfer7_piece_8 - Plane(origin=(70, -10, -219.960344511), x_dir=(-1, 0, 0), z_dir=(0, 0, -1)) * Cylinder(5, 380, mode=Mode.PRIVATE)
    add(chamfer7_piece_8)
    with BuildSketch(Plane(origin=(190, 0, -5), x_dir=(0, 0.02749587661058637, -0.9996219169112968), z_dir=(-1, 0, 0))) as chamfer7_piece_9_section:
        Polygon((CHAMFER7_SIZE * 0.999621916911, CHAMFER7_SIZE * 0.0274958766106), (-CHAMFER7_SIZE * 0.0274958766106, CHAMFER7_SIZE * 0.999621916911), (0, 0), align=None)
    chamfer7_piece_9 = extrude(amount=160, mode=Mode.PRIVATE)
    chamfer7_piece_9 = chamfer7_piece_9 - Plane(origin=(150, -10, -10.039655489), x_dir=(1, 0, 0), z_dir=(0, 0, -1)) * Cylinder(5, 380, mode=Mode.PRIVATE)
    chamfer7_piece_9 = chamfer7_piece_9 - Plane(origin=(70, -10, -10.039655489), x_dir=(-1, 0, 0), z_dir=(0, 0, -1)) * Cylinder(5, 380, mode=Mode.PRIVATE)
    add(chamfer7_piece_9)
    with BuildSketch(Plane(origin=(30, 0, -30), x_dir=(0, 0, 1), z_dir=(1, 0, 0))) as chamfer7_piece_10:
        Polygon((25 - CHAMFER7_SIZE, 0), (25, CHAMFER7_SIZE), (25, 0), align=None)
    revolve(axis=Axis((30, 0, -30), (0, -1, 0)), revolution_arc=90)
    with BuildSketch(Plane(origin=(190, 0, -30), x_dir=(1, 0, 0), z_dir=(0, 0, -1))) as chamfer7_piece_11:
        Polygon((25 - CHAMFER7_SIZE, 0), (25, CHAMFER7_SIZE), (25, 0), align=None)
    revolve(axis=Axis((190, 0, -30), (0, -1, 0)), revolution_arc=90)
    with BuildSketch(Plane(origin=(215, 0, -200), x_dir=(-0.9996219169112966, 0.02749587661058638, 0), z_dir=(0, 0, 1)), Plane(origin=(5, 0, -30), x_dir=(0.9996219169112966, 0.027495876610586358, 0), z_dir=(0, 0, -1))) as chamfer7_piece_12:
        Polygon((CHAMFER7_SIZE * 0.999621916911, CHAMFER7_SIZE * 0.0274958766106), (-CHAMFER7_SIZE * 0.0274958766106, CHAMFER7_SIZE * 0.999621916911), (0, 0), align=None)
    extrude(amount=170)
    with BuildSketch(Plane(origin=(190, 0, -200), x_dir=(0, 0, -1), z_dir=(-1, 0, 0))) as chamfer7_piece_13:
        Polygon((25 - CHAMFER7_SIZE, 0), (25, CHAMFER7_SIZE), (25, 0), align=None)
    revolve(axis=Axis((190, 0, -200), (0, -1, 0)), revolution_arc=90)
    with BuildSketch(Plane(origin=(30, 0, -200), x_dir=(-1, 0, 0), z_dir=(0, 0, 1))) as chamfer7_piece_14:
        Polygon((25 - CHAMFER7_SIZE, 0), (25, CHAMFER7_SIZE), (25, 0), align=None)
    revolve(axis=Axis((30, 0, -200), (0, -1, 0)), revolution_arc=90)

    # Sketch6 → Cut-Extrude6 (cut)
    with BuildSketch(Plane.XY):
        Polygon((140.762833455, 19.910069191), (145.459299093, 11.955413708), (154.696465638, 12.045344517), (159.237166545, 20.089930809), (154.540700907, 28.044586292), (145.303534362, 27.954655483), align=None)
        Polygon((65.285101729, 27.94374393), (60.76306682, 19.888650286), (65.477965091, 11.944906356), (74.714898271, 12.05625607), (79.23693318, 20.111349714), (74.522034909, 28.055093644), align=None)
        Polygon((140.763314396, -9.869721899), (145.268833053, -17.934065329), (154.505518657, -18.064343431), (159.236685604, -10.130278101), (154.731166947, -2.065934671), (145.494481343, -1.935656569), align=None)
        Polygon((60.763314396, -9.869721899), (65.268833053, -17.934065329), (74.505518657, -18.064343431), (79.236685604, -10.130278101), (74.731166947, -2.065934671), (65.494481343, -1.935656569), align=None)
    extrude(amount=-CUT_EXTRUDE6_DEPTH, mode=Mode.SUBTRACT)

    # Sketch2<4> → Cut-Extrude2 (cut)
    # profile 1 of 4: a face of its own
    with BuildSketch(Plane(origin=(0, 0, -230), x_dir=(-1, 0, 0), z_dir=(0, 0, -1))):
        Polygon((-74.618802154, 12), (-79.237604307, 20), (-74.618802154, 28), (-65.381197846, 28), (-60.762395693, 20), (-65.381197846, 12), align=None)
        with Locations((-70, 20)):
            Circle(SKETCH2_4_R, mode=Mode.SUBTRACT)
    # profile 2 of 4: a face of its own
    with BuildSketch(Plane(origin=(0, 0, -230), x_dir=(-1, 0, 0), z_dir=(0, 0, -1))):
        Polygon((-140.762395693, 20), (-145.381197846, 28), (-154.618802154, 28), (-159.237604307, 20), (-154.618802154, 12), (-145.381197846, 12), align=None)
        with Locations((-150, 20)):
            Circle(SKETCH2_4_R, mode=Mode.SUBTRACT)
    # profile 3 of 4: a face of its own
    with BuildSketch(Plane(origin=(0, 0, -230), x_dir=(-1, 0, 0), z_dir=(0, 0, -1))):
        Polygon((-65.381197846, -2), (-74.618802154, -2), (-79.237604307, -10), (-74.618802154, -18), (-65.381197846, -18), (-60.762395693, -10), align=None)
        with Locations((-70, -10)):
            Circle(SKETCH2_4_R, mode=Mode.SUBTRACT)
    # profile 4 of 4: a face of its own
    with BuildSketch(Plane(origin=(0, 0, -230), x_dir=(-1, 0, 0), z_dir=(0, 0, -1))):
        Polygon((-145.381197846, -2), (-140.762395693, -10), (-145.381197846, -18), (-154.618802154, -18), (-159.237604307, -10), (-154.618802154, -2), align=None)
        with Locations((-150, -10)):
            Circle(SKETCH2_4_R, mode=Mode.SUBTRACT)
    extrude(amount=-CUT_EXTRUDE2_DEPTH, mode=Mode.SUBTRACT)


solid = part.part
